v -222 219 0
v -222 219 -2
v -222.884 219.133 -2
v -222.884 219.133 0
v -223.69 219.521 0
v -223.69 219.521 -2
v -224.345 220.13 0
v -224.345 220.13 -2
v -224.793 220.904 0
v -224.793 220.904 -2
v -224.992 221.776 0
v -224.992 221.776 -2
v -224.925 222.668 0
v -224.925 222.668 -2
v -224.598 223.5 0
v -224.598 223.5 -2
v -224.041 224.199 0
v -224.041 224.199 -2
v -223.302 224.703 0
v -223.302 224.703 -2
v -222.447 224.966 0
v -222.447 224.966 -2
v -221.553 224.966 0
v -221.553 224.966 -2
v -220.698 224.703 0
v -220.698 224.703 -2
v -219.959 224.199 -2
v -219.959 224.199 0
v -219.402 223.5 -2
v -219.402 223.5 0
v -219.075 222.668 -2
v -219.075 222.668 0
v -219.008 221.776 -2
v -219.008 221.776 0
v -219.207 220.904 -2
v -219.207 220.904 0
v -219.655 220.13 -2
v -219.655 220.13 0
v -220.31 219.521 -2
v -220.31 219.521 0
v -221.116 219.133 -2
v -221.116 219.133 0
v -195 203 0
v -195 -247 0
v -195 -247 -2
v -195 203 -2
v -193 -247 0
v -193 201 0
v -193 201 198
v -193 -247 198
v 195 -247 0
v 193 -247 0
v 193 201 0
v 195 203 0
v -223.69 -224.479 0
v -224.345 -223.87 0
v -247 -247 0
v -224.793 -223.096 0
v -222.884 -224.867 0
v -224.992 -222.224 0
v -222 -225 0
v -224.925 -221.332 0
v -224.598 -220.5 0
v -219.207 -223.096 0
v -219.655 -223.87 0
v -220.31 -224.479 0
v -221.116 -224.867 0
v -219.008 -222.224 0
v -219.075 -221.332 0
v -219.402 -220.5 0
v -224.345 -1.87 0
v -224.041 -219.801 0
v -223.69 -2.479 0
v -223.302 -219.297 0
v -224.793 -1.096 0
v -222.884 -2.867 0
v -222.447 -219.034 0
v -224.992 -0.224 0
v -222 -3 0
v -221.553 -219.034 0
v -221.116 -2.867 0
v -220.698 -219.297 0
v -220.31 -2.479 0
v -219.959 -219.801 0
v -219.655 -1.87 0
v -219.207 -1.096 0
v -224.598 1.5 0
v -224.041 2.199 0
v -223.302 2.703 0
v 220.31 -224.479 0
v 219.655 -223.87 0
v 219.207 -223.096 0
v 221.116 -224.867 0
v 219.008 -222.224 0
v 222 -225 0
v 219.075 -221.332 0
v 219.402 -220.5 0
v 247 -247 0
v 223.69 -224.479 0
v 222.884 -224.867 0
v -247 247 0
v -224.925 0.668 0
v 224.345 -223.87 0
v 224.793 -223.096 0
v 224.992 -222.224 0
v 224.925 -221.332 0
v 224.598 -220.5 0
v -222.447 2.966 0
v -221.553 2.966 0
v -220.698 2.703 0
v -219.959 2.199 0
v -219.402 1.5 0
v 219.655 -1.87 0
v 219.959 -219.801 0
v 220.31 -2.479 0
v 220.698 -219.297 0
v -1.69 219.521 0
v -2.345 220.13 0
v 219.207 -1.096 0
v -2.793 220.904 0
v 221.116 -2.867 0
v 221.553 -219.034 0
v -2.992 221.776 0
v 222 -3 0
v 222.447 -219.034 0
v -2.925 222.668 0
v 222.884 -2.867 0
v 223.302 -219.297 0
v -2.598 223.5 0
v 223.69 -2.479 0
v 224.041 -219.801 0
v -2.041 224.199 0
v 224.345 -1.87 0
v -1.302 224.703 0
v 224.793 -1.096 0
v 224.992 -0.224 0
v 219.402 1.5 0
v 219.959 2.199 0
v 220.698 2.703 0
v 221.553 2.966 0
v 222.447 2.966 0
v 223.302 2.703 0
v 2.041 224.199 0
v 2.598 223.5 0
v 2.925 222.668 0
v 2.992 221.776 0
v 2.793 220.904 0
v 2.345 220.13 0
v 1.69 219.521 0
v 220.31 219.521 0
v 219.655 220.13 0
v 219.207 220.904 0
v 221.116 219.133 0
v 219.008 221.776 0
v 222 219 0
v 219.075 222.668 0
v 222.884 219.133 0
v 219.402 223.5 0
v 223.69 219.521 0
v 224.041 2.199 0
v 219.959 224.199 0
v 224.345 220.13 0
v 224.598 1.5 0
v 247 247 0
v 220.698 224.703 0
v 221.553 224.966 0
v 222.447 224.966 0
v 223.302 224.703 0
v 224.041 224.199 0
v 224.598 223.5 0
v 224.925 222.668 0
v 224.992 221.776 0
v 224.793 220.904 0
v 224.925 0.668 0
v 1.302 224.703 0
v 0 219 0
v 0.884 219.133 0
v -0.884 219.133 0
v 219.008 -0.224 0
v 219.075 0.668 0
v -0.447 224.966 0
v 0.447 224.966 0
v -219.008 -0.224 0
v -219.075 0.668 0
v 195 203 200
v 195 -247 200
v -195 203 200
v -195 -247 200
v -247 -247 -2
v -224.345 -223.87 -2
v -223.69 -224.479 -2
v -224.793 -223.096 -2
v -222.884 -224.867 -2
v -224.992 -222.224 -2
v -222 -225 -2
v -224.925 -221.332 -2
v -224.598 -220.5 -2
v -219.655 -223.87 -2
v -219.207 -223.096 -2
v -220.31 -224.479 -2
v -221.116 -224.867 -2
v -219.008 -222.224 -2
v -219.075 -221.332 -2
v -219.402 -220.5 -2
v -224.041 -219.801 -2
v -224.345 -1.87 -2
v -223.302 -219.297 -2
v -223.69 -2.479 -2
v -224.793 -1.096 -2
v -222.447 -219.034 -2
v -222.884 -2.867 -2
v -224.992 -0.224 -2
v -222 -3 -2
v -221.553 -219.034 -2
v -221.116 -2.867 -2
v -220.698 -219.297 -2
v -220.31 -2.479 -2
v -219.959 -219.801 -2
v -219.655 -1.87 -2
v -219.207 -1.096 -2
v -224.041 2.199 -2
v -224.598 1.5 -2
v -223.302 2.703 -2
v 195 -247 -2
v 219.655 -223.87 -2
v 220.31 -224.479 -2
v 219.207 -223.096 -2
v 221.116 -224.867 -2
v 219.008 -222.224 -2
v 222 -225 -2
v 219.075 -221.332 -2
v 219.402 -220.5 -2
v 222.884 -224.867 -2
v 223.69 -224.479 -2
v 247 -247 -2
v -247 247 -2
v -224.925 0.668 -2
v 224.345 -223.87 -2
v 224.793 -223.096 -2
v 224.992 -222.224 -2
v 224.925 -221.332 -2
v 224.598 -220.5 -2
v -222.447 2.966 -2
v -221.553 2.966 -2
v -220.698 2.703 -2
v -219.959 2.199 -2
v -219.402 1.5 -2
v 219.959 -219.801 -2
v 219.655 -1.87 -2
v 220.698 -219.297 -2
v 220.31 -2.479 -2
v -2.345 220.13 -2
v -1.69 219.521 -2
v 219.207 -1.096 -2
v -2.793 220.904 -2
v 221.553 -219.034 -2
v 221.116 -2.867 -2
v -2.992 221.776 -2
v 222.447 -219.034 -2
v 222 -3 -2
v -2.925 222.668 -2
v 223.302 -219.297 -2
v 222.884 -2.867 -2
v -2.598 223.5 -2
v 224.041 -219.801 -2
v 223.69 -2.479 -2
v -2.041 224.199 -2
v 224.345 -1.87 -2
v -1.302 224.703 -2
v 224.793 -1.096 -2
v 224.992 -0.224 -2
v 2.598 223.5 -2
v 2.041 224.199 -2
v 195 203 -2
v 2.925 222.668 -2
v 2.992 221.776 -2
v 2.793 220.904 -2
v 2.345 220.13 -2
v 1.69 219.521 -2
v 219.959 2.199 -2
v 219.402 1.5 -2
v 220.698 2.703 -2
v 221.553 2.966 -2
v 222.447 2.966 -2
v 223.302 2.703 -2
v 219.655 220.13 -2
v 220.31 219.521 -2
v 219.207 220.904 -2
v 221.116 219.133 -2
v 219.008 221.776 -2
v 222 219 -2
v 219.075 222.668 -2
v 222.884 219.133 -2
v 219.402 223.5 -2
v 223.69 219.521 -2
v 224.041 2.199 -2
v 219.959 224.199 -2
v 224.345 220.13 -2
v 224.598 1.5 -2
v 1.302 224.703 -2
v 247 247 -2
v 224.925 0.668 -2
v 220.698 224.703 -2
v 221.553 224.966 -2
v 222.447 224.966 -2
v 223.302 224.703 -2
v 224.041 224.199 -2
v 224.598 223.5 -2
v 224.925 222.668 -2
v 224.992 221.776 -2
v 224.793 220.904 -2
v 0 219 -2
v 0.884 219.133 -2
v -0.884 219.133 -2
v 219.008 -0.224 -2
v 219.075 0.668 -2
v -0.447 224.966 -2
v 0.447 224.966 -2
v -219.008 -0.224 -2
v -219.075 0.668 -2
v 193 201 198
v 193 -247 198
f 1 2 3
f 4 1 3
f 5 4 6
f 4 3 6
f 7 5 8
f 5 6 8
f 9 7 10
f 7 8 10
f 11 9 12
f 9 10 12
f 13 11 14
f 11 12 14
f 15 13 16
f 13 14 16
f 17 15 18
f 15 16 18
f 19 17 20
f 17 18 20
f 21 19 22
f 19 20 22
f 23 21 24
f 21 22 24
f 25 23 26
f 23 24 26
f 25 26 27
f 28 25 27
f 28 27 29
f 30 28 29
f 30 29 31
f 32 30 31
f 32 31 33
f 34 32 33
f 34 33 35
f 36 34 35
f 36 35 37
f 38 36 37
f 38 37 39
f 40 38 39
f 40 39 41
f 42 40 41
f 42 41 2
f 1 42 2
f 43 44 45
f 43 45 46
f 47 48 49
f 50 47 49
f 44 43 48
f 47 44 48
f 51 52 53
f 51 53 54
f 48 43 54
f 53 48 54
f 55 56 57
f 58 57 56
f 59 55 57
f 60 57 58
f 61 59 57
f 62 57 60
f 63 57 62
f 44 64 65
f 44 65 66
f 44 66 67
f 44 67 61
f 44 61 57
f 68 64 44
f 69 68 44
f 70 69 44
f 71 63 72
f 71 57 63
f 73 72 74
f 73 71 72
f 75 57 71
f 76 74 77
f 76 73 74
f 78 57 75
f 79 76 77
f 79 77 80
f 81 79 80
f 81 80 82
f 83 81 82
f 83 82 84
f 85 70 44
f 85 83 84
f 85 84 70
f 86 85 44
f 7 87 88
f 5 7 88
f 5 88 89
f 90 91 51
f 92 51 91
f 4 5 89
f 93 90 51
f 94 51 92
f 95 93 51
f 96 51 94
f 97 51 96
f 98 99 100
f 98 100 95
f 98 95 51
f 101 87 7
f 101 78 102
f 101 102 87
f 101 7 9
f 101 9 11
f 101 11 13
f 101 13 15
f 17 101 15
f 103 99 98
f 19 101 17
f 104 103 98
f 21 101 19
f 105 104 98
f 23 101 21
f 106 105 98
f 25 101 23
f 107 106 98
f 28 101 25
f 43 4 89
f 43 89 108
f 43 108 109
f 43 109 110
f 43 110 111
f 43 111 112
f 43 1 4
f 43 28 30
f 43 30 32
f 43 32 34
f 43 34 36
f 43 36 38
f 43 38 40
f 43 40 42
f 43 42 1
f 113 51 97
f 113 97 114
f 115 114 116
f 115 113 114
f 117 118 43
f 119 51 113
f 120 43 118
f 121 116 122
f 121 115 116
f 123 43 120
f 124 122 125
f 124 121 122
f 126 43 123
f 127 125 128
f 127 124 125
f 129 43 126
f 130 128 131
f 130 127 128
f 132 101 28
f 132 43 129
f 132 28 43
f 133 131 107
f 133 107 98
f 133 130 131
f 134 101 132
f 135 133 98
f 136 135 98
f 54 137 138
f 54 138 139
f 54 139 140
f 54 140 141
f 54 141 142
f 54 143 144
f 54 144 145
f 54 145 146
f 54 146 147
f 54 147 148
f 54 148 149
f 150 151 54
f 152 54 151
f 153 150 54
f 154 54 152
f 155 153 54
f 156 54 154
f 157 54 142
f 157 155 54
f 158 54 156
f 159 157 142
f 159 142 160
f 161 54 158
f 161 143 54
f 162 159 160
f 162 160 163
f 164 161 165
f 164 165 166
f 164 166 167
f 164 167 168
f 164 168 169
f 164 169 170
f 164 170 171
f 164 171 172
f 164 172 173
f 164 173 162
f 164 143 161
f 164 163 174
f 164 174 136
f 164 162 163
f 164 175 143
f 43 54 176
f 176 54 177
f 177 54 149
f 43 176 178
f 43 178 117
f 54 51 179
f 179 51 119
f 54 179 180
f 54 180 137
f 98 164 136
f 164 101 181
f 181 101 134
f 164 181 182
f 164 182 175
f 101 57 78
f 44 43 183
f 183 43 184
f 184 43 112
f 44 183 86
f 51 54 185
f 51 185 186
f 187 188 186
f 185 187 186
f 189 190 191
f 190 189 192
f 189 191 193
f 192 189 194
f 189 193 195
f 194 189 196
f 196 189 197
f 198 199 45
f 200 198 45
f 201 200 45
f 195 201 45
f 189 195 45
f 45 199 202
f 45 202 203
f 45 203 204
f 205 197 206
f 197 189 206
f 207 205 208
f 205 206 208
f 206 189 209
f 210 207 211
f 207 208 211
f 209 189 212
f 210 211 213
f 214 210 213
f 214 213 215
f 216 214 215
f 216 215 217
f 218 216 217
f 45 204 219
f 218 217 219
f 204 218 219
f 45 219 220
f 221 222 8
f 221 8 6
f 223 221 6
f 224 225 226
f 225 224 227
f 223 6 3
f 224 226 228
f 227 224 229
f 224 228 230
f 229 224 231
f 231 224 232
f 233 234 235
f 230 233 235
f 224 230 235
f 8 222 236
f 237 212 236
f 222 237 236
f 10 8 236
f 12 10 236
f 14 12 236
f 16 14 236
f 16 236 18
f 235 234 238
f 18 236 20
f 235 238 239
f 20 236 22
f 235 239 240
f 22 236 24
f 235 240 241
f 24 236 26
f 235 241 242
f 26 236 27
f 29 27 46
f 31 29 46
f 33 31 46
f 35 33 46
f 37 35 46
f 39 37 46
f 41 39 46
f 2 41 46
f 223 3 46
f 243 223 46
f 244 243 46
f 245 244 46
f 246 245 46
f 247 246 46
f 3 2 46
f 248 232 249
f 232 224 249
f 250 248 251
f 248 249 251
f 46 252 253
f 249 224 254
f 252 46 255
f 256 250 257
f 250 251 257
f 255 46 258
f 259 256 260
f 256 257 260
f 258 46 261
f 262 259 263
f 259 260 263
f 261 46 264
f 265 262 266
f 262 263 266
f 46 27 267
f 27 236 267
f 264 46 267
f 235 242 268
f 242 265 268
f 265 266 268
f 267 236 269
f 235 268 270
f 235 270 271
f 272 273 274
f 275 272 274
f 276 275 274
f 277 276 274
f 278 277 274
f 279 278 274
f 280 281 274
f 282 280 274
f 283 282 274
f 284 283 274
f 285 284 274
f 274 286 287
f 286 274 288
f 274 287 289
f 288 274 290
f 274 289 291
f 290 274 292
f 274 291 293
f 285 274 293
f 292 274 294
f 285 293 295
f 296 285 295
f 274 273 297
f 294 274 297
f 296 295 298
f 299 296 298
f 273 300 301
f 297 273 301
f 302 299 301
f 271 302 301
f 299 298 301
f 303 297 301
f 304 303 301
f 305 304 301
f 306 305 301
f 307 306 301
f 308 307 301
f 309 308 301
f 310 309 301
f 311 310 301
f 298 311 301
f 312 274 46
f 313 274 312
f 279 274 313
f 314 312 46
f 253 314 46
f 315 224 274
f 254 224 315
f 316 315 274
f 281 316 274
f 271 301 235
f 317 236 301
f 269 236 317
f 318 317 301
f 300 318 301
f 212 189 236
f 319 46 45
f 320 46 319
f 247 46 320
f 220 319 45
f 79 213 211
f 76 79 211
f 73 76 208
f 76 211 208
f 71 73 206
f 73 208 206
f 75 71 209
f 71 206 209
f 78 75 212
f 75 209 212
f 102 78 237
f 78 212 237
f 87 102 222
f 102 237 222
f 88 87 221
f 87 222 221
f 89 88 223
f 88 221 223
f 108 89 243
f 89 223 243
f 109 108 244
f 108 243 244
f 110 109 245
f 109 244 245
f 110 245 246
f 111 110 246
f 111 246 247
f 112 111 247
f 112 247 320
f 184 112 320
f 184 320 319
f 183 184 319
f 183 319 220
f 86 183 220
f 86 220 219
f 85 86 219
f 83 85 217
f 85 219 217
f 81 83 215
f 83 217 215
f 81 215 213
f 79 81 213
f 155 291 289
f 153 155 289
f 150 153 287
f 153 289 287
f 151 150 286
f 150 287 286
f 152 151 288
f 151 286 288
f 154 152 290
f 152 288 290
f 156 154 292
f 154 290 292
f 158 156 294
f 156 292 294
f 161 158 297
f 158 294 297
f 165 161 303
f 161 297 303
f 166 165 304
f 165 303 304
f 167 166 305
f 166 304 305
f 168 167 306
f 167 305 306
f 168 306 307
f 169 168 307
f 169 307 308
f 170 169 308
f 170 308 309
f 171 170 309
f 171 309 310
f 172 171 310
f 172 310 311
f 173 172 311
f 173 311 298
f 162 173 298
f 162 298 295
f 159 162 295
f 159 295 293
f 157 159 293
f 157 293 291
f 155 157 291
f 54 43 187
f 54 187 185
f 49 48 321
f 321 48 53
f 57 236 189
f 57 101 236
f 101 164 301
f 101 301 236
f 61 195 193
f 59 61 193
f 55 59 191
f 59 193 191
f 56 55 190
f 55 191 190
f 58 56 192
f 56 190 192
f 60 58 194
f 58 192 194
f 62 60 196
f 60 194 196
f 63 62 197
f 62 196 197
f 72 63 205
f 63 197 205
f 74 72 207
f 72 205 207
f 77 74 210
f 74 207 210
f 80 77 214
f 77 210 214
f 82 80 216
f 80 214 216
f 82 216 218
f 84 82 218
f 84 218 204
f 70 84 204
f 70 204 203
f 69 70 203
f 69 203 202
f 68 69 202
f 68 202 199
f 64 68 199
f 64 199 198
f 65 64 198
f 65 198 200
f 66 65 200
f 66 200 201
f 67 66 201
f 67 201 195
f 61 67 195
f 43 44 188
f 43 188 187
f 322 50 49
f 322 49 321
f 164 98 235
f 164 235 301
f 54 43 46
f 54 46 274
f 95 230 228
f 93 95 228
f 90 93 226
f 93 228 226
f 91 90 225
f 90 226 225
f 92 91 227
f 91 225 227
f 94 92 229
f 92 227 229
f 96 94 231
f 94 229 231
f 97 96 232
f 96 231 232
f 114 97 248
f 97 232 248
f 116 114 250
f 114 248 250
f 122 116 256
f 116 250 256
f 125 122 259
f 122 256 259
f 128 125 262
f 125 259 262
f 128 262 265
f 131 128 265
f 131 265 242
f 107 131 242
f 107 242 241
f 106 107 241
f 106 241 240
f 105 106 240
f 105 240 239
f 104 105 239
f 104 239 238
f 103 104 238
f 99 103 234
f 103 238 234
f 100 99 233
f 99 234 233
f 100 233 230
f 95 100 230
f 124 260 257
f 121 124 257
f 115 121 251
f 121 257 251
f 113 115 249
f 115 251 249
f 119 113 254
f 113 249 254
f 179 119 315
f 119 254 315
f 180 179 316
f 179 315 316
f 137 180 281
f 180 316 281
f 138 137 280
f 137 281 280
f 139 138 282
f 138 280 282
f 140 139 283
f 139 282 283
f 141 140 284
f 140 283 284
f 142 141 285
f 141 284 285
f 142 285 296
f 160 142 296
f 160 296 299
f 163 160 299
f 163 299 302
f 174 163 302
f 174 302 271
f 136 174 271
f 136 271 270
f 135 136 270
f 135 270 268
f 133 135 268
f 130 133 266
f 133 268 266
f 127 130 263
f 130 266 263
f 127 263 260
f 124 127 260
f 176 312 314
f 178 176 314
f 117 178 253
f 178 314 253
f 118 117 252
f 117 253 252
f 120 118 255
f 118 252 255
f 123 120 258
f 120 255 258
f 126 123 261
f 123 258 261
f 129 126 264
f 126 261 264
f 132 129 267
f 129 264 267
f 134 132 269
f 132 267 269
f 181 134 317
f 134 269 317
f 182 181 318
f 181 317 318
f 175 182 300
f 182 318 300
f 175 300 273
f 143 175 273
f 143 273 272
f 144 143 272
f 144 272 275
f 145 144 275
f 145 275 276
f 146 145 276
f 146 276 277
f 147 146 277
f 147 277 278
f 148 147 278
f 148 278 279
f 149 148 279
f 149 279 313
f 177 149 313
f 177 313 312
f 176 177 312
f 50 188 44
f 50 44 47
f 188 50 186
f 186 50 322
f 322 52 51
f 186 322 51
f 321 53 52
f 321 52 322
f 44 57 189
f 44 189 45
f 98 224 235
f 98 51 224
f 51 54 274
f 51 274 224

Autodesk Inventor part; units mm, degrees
ref_plane "YZ Plane" through (0, 0, 0) normal (1, 0, 0) x (0, 1, 0)
ref_plane "XZ Plane" through (0, 0, 0) normal (0, 1, 0) x (-1, 0, 0)
ref_plane "XY Plane" through (0, 0, 0) normal (0, 0, 1) x (1, 0, 0)
sketch "Sketch1" plane through (0, 0, 0) normal (0, 0, 1) x (1, 0, 0)
  line L0 (-247, -247) -> (247, -247)
  line L1 (247, -247) -> (247, 247)
  line L2 (247, 247) -> (-247, 247)
  line L3 (-247, 247) -> (-247, -247)
  line L4 (-247, -247) -> (247, 247) construction
  line L5 (247, -247) -> (-247, 247) construction
  line L6 (-195, -247) -> (-195, 203)
  line L7 (-195, 203) -> (195, 203)
  line L8 (195, 203) -> (195, -247)
  line L9 (195, -247) -> (-195, -247)
  line L10 (0, 247) -> (0, -247) construction
  point P0 (0, 0)
  dimension "d0" = 494
  dimension "d1" = 494
  dimension "d4" = 390
  dimension "d5" = 450
extrude "Extrusion2" add sketch "Sketch1" along normal blind 200 contours L6 L7 L8 L0
shell "Shell2" thickness 2 removed faces 1 at (65, -97, 0)
extrude "Extrusion3" add sketch "Sketch1" against normal blind 2 contours L3 L2 L1 L0 L8 L7 L6
hole "Hole1" at (-222, 222, 0) direction (0, 0, -1) diameter 6 end through all
pattern_linear "Rectangular Pattern1" count 3 spacing 222 along (1, 0, 0) count 3 spacing 222 along (0, -1, 0) of "Hole1"
sketch "Sketch2" plane through (-193, -245, 0) normal (0, 1, 0) x (1, 0, 0)
  line L0 (0, 0) -> (386, 0) projected
  line L1 (0, 0) -> (0, -198) projected
  line L2 (0, -198) -> (386, -198) projected
  line L3 (386, 0) -> (386, -198) projected
  point P0 (193, 0)
extrude "Extrusion4" cut sketch "Sketch2" against normal up to next
properties part number "SidePanelCover"
